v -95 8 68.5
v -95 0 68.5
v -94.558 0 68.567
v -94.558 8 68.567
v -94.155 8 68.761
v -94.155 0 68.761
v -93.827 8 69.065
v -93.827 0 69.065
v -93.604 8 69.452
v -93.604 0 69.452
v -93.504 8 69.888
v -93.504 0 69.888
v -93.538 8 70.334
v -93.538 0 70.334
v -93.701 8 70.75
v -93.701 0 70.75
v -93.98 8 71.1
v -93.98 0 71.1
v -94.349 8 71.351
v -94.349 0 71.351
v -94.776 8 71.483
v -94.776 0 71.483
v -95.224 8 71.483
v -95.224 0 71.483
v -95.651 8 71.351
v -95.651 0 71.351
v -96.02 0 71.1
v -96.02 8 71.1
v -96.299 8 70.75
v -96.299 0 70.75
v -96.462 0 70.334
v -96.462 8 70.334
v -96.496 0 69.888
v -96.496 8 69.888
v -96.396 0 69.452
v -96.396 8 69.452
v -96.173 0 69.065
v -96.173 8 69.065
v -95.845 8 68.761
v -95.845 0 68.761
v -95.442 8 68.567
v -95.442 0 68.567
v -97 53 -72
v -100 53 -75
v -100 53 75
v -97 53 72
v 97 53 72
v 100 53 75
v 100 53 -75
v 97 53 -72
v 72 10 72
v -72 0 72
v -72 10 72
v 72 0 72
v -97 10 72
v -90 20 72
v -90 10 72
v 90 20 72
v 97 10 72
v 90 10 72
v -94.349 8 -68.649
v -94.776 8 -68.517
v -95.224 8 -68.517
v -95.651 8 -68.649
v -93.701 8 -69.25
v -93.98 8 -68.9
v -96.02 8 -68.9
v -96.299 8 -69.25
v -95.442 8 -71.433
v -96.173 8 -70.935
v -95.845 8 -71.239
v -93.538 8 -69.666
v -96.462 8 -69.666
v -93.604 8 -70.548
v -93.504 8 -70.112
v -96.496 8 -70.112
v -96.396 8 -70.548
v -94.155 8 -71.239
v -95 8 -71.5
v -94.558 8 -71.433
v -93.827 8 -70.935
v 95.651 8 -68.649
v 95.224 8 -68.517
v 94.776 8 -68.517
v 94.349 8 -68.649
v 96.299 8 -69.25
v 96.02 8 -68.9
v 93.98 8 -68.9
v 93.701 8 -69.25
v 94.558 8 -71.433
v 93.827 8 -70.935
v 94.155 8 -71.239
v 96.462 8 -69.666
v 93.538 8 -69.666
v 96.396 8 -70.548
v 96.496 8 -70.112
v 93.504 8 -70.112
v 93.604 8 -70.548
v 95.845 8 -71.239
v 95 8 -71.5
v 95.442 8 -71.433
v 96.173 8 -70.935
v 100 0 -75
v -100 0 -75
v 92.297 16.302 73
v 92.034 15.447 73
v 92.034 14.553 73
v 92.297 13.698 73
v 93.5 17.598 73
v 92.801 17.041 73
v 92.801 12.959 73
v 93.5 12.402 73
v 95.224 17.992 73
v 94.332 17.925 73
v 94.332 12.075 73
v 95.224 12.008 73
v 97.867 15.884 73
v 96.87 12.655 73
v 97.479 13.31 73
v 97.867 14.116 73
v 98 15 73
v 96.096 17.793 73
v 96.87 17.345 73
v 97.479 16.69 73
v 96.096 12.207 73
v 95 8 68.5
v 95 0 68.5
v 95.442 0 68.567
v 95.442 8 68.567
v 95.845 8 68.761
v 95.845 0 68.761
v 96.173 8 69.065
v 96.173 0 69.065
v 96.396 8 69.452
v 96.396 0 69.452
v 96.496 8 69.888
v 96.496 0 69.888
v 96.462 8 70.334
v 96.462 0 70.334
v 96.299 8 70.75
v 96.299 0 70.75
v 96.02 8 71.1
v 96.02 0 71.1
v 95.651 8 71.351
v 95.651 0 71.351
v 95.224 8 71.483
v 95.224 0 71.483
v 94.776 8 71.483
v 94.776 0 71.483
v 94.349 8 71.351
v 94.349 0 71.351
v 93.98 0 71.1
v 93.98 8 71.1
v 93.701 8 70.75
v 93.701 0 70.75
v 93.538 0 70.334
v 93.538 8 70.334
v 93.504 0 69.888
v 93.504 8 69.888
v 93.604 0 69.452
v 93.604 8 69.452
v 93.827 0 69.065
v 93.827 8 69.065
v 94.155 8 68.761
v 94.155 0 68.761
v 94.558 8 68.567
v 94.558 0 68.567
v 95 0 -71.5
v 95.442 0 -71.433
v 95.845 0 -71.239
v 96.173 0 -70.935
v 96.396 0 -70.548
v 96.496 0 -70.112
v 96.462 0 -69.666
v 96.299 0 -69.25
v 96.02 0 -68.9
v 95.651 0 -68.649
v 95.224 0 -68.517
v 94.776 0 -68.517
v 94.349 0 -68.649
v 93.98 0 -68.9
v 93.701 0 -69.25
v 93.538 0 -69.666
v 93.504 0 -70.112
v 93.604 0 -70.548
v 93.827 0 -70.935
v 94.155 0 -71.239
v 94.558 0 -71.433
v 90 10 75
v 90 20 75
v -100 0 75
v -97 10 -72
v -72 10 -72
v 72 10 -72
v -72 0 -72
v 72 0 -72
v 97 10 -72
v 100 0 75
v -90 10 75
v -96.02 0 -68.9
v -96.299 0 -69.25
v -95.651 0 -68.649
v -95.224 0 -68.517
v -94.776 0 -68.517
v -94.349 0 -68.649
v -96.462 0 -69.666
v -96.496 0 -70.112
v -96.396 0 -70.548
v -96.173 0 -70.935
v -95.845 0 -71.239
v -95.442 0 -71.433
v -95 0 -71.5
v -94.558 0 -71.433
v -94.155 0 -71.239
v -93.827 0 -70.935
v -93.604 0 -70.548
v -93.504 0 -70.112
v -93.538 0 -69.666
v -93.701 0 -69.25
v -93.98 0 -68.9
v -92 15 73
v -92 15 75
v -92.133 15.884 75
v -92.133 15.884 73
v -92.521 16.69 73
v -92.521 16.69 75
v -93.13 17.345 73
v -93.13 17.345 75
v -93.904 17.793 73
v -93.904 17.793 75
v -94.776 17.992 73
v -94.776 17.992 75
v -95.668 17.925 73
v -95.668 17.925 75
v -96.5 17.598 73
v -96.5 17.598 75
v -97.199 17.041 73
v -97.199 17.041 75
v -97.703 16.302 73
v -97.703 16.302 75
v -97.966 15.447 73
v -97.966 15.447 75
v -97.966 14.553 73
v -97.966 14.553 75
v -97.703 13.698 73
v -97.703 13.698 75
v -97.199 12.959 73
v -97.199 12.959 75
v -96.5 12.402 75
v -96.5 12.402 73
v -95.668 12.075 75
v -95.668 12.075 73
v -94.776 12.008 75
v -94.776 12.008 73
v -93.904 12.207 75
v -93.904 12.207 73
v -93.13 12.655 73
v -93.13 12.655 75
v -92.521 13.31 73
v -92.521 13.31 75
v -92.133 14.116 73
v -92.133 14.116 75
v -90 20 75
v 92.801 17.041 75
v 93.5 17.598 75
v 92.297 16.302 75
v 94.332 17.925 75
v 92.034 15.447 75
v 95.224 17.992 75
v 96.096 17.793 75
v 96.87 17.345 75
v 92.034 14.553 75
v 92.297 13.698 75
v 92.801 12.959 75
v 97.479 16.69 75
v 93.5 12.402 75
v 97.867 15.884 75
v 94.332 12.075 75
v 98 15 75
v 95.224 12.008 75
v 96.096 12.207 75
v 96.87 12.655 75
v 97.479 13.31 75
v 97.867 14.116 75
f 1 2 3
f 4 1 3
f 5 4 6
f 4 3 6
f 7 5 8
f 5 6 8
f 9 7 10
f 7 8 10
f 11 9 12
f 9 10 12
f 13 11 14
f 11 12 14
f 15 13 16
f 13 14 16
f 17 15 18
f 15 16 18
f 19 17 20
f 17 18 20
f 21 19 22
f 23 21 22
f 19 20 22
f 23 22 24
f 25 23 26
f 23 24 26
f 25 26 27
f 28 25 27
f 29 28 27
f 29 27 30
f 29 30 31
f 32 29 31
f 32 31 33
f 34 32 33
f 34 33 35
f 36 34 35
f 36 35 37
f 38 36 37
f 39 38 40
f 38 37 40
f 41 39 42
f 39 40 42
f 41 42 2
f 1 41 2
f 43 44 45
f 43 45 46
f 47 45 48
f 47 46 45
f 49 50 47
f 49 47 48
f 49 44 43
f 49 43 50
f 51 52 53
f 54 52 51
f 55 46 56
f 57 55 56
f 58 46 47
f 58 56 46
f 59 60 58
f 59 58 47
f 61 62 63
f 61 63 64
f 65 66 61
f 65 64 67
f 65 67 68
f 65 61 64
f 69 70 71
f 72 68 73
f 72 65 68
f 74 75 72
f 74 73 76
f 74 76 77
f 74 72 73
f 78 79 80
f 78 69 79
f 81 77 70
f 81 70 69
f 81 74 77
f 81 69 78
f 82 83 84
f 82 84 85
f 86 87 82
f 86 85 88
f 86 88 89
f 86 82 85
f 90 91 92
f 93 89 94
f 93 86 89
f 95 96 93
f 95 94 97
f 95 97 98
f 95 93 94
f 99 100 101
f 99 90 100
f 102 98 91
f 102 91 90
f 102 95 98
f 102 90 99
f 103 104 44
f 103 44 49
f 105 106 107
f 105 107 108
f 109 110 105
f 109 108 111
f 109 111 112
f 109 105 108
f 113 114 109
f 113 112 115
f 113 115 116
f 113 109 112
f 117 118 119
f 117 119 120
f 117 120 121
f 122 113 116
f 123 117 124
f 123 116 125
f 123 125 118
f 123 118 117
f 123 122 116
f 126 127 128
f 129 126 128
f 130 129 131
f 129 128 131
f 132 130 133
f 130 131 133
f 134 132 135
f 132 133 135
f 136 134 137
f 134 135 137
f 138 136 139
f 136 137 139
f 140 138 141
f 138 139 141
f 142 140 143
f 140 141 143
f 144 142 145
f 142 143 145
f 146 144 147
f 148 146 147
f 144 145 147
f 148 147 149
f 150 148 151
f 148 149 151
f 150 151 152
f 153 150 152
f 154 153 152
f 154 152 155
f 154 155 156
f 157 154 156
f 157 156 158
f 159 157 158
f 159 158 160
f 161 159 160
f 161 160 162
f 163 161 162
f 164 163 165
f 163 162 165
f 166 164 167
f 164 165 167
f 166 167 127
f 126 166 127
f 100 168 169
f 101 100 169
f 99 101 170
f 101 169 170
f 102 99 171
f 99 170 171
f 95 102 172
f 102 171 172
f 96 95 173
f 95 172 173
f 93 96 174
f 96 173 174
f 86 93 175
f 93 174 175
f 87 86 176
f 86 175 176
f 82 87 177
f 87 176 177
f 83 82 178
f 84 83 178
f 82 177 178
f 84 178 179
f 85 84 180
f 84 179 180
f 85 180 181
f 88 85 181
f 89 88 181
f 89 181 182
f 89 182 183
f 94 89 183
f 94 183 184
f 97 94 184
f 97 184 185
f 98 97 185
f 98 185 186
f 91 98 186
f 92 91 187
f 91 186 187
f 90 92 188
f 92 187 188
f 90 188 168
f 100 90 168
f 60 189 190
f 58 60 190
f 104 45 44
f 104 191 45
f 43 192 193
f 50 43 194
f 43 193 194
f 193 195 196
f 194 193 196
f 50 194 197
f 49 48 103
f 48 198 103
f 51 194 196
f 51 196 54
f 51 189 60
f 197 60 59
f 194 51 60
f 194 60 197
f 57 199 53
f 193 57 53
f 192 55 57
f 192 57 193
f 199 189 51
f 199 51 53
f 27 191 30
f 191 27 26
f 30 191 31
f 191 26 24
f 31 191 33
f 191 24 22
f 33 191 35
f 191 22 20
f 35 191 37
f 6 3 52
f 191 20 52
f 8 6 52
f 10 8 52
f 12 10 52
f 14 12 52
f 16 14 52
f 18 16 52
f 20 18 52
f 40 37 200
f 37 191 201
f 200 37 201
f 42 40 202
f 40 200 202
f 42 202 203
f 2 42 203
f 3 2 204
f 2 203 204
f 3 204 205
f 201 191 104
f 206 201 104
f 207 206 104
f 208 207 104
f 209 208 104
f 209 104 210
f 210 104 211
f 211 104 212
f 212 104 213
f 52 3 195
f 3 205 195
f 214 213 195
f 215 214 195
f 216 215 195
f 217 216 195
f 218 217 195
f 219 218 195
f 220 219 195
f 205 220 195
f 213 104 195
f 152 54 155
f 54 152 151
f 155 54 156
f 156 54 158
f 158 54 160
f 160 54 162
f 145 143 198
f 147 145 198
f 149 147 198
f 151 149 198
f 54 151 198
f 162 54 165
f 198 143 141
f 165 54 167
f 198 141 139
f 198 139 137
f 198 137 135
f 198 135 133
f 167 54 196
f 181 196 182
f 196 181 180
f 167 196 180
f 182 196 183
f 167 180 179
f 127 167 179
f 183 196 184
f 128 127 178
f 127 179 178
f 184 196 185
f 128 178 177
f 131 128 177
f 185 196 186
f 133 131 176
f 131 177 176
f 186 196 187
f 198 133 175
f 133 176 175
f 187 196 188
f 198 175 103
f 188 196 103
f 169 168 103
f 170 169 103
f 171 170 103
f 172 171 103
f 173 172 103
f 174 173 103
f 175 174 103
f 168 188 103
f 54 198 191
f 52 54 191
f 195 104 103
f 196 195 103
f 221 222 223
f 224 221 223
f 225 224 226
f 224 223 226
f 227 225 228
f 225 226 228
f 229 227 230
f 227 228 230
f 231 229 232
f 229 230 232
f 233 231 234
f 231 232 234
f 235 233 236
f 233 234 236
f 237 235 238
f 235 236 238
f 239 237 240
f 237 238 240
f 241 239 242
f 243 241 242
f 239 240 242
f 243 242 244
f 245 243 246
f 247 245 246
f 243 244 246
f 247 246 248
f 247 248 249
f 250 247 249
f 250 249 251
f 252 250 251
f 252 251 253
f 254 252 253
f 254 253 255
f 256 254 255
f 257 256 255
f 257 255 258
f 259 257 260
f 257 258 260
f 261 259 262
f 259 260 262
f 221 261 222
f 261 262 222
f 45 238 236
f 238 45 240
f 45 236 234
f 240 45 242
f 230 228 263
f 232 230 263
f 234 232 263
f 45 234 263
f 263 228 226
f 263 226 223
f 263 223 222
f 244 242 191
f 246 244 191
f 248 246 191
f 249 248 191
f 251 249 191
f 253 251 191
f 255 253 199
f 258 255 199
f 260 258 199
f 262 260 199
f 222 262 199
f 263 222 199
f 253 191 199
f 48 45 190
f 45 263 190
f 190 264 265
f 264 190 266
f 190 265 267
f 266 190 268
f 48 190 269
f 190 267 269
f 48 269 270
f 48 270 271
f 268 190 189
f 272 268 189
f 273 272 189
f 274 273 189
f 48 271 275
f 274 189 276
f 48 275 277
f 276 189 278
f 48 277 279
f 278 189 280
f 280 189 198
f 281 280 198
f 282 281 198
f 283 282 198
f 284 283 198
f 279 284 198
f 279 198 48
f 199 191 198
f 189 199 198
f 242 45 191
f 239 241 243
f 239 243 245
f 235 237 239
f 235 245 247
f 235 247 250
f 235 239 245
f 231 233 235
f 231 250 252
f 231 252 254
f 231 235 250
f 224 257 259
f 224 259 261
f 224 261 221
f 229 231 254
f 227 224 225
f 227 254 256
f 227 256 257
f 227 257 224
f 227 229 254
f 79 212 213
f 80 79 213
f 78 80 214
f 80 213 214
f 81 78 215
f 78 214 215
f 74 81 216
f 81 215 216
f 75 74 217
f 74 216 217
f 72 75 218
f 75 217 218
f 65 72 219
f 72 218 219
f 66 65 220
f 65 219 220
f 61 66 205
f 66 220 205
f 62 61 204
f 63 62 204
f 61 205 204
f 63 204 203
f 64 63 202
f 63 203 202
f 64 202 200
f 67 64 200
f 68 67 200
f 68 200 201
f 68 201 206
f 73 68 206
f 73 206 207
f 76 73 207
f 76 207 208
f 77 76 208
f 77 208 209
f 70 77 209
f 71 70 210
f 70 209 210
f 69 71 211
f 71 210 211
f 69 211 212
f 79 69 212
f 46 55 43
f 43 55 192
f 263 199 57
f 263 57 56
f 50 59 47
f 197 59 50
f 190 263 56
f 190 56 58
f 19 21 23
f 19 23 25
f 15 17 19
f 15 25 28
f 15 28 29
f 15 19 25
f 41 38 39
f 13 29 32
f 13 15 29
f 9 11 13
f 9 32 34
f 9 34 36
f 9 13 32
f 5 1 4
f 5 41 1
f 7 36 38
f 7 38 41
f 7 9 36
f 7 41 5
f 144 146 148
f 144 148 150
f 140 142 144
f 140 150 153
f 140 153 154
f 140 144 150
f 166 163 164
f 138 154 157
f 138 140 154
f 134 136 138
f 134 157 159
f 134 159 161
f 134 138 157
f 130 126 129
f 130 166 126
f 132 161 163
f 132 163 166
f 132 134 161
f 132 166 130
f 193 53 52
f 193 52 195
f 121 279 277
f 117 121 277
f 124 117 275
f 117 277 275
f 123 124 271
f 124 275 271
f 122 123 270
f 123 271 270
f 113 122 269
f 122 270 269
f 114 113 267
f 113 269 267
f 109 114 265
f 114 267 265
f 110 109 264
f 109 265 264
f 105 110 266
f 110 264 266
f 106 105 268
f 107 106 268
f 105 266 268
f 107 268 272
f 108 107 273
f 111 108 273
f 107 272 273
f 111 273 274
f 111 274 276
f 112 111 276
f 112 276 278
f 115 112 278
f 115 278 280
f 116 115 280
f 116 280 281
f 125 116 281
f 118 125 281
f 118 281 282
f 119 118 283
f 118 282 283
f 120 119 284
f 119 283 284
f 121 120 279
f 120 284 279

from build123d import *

# Parameters (mm, degrees)
SKETCH2_W           = 200
SKETCH2_H           = 150
BOSS_EXTRUDE1_DEPTH = 3
SKETCH3_W           = 200
SKETCH3_H           = 150
SKETCH3_W_2         = 194
SKETCH3_H_2         = 144
BOSS_EXTRUDE2_DEPTH = 50
SKETCH4_W           = 180
SKETCH4_H           = 10
CUT_EXTRUDE3_DEPTH  = 147
SKETCH5_W           = 144
SKETCH5_H           = 7
BOSS_EXTRUDE3_DEPTH = 25
SKETCH6_W           = 144
SKETCH6_H           = 7
BOSS_EXTRUDE4_DEPTH = 25
SKETCH7_W           = 144
SKETCH7_H           = 144
CUT_EXTRUDE5_DEPTH  = 135.629120178
SKETCH8_R           = 3
CUT_EXTRUDE6_DEPTH  = 2
SKETCH9_R           = 1.5
CUT_EXTRUDE7_DEPTH  = 8


with BuildPart() as part:
    # Sketch2 → Boss-Extrude1 (new body)
    with BuildSketch(Plane(origin=(0, 0, 0), x_dir=(1, 0, 0), z_dir=(0, 1, 0))):
        Rectangle(SKETCH2_W, SKETCH2_H)
    extrude(amount=BOSS_EXTRUDE1_DEPTH)

    # Sketch3 → Boss-Extrude2 (add)
    with BuildSketch(Plane(origin=(0, 3, 0), x_dir=(1, 0, 0), z_dir=(0, 1, 0))):
        Rectangle(SKETCH3_W, SKETCH3_H)
        Rectangle(SKETCH3_W_2, SKETCH3_H_2, mode=Mode.SUBTRACT)
    extrude(amount=BOSS_EXTRUDE2_DEPTH)

    # Sketch4 → Cut-Extrude3 (cut)
    with BuildSketch(Plane.XY.offset(75)):
        with Locations((0, 15)):
            Rectangle(SKETCH4_W, SKETCH4_H)
    extrude(amount=-CUT_EXTRUDE3_DEPTH, mode=Mode.SUBTRACT)

    # Sketch5 → Boss-Extrude3 (add)
    with BuildSketch(Plane.ZY.offset(-97)):
        with Locations((0, 6.5)):
            Rectangle(SKETCH5_W, SKETCH5_H)
    extrude(amount=BOSS_EXTRUDE3_DEPTH)

    # Sketch6 → Boss-Extrude4 (add)
    with BuildSketch(Plane(origin=(-97, 0, 0), x_dir=(0, 0, -1), z_dir=(1, 0, 0))):
        with Locations((0, 6.5)):
            Rectangle(SKETCH6_W, SKETCH6_H)
    extrude(amount=BOSS_EXTRUDE4_DEPTH)

    # Sketch7 → Cut-Extrude5 (cut, through all)
    with BuildSketch(Plane(origin=(0, 3, 0), x_dir=(1, 0, 0), z_dir=(0, 1, 0))):
        Rectangle(SKETCH7_W, SKETCH7_H)
    extrude(amount=-CUT_EXTRUDE5_DEPTH, mode=Mode.SUBTRACT)

    # Sketch8 → Cut-Extrude6 (cut)
    with BuildSketch(Plane.XY.offset(75)):
        with Locations((-95, 15)):
            Circle(SKETCH8_R)
        with Locations((95, 15)):
            Circle(SKETCH8_R)
    extrude(amount=-CUT_EXTRUDE6_DEPTH, mode=Mode.SUBTRACT)

    # Sketch9 → Cut-Extrude7 (cut)
    with BuildSketch(Plane.XZ):
        with Locations(Location((-95, 70, 0), (0, 0, 270))):
            Circle(SKETCH9_R)
        with Locations(Location((95, 70, 0), (0, 0, 270))):
            Circle(SKETCH9_R)
        with Locations(Location((95, -70, 0), (0, 0, 270))):
            Circle(SKETCH9_R)
        with Locations(Location((-95, -70, 0), (0, 0, 270))):
            Circle(SKETCH9_R)
    extrude(amount=-CUT_EXTRUDE7_DEPTH, mode=Mode.SUBTRACT)


solid = part.part
